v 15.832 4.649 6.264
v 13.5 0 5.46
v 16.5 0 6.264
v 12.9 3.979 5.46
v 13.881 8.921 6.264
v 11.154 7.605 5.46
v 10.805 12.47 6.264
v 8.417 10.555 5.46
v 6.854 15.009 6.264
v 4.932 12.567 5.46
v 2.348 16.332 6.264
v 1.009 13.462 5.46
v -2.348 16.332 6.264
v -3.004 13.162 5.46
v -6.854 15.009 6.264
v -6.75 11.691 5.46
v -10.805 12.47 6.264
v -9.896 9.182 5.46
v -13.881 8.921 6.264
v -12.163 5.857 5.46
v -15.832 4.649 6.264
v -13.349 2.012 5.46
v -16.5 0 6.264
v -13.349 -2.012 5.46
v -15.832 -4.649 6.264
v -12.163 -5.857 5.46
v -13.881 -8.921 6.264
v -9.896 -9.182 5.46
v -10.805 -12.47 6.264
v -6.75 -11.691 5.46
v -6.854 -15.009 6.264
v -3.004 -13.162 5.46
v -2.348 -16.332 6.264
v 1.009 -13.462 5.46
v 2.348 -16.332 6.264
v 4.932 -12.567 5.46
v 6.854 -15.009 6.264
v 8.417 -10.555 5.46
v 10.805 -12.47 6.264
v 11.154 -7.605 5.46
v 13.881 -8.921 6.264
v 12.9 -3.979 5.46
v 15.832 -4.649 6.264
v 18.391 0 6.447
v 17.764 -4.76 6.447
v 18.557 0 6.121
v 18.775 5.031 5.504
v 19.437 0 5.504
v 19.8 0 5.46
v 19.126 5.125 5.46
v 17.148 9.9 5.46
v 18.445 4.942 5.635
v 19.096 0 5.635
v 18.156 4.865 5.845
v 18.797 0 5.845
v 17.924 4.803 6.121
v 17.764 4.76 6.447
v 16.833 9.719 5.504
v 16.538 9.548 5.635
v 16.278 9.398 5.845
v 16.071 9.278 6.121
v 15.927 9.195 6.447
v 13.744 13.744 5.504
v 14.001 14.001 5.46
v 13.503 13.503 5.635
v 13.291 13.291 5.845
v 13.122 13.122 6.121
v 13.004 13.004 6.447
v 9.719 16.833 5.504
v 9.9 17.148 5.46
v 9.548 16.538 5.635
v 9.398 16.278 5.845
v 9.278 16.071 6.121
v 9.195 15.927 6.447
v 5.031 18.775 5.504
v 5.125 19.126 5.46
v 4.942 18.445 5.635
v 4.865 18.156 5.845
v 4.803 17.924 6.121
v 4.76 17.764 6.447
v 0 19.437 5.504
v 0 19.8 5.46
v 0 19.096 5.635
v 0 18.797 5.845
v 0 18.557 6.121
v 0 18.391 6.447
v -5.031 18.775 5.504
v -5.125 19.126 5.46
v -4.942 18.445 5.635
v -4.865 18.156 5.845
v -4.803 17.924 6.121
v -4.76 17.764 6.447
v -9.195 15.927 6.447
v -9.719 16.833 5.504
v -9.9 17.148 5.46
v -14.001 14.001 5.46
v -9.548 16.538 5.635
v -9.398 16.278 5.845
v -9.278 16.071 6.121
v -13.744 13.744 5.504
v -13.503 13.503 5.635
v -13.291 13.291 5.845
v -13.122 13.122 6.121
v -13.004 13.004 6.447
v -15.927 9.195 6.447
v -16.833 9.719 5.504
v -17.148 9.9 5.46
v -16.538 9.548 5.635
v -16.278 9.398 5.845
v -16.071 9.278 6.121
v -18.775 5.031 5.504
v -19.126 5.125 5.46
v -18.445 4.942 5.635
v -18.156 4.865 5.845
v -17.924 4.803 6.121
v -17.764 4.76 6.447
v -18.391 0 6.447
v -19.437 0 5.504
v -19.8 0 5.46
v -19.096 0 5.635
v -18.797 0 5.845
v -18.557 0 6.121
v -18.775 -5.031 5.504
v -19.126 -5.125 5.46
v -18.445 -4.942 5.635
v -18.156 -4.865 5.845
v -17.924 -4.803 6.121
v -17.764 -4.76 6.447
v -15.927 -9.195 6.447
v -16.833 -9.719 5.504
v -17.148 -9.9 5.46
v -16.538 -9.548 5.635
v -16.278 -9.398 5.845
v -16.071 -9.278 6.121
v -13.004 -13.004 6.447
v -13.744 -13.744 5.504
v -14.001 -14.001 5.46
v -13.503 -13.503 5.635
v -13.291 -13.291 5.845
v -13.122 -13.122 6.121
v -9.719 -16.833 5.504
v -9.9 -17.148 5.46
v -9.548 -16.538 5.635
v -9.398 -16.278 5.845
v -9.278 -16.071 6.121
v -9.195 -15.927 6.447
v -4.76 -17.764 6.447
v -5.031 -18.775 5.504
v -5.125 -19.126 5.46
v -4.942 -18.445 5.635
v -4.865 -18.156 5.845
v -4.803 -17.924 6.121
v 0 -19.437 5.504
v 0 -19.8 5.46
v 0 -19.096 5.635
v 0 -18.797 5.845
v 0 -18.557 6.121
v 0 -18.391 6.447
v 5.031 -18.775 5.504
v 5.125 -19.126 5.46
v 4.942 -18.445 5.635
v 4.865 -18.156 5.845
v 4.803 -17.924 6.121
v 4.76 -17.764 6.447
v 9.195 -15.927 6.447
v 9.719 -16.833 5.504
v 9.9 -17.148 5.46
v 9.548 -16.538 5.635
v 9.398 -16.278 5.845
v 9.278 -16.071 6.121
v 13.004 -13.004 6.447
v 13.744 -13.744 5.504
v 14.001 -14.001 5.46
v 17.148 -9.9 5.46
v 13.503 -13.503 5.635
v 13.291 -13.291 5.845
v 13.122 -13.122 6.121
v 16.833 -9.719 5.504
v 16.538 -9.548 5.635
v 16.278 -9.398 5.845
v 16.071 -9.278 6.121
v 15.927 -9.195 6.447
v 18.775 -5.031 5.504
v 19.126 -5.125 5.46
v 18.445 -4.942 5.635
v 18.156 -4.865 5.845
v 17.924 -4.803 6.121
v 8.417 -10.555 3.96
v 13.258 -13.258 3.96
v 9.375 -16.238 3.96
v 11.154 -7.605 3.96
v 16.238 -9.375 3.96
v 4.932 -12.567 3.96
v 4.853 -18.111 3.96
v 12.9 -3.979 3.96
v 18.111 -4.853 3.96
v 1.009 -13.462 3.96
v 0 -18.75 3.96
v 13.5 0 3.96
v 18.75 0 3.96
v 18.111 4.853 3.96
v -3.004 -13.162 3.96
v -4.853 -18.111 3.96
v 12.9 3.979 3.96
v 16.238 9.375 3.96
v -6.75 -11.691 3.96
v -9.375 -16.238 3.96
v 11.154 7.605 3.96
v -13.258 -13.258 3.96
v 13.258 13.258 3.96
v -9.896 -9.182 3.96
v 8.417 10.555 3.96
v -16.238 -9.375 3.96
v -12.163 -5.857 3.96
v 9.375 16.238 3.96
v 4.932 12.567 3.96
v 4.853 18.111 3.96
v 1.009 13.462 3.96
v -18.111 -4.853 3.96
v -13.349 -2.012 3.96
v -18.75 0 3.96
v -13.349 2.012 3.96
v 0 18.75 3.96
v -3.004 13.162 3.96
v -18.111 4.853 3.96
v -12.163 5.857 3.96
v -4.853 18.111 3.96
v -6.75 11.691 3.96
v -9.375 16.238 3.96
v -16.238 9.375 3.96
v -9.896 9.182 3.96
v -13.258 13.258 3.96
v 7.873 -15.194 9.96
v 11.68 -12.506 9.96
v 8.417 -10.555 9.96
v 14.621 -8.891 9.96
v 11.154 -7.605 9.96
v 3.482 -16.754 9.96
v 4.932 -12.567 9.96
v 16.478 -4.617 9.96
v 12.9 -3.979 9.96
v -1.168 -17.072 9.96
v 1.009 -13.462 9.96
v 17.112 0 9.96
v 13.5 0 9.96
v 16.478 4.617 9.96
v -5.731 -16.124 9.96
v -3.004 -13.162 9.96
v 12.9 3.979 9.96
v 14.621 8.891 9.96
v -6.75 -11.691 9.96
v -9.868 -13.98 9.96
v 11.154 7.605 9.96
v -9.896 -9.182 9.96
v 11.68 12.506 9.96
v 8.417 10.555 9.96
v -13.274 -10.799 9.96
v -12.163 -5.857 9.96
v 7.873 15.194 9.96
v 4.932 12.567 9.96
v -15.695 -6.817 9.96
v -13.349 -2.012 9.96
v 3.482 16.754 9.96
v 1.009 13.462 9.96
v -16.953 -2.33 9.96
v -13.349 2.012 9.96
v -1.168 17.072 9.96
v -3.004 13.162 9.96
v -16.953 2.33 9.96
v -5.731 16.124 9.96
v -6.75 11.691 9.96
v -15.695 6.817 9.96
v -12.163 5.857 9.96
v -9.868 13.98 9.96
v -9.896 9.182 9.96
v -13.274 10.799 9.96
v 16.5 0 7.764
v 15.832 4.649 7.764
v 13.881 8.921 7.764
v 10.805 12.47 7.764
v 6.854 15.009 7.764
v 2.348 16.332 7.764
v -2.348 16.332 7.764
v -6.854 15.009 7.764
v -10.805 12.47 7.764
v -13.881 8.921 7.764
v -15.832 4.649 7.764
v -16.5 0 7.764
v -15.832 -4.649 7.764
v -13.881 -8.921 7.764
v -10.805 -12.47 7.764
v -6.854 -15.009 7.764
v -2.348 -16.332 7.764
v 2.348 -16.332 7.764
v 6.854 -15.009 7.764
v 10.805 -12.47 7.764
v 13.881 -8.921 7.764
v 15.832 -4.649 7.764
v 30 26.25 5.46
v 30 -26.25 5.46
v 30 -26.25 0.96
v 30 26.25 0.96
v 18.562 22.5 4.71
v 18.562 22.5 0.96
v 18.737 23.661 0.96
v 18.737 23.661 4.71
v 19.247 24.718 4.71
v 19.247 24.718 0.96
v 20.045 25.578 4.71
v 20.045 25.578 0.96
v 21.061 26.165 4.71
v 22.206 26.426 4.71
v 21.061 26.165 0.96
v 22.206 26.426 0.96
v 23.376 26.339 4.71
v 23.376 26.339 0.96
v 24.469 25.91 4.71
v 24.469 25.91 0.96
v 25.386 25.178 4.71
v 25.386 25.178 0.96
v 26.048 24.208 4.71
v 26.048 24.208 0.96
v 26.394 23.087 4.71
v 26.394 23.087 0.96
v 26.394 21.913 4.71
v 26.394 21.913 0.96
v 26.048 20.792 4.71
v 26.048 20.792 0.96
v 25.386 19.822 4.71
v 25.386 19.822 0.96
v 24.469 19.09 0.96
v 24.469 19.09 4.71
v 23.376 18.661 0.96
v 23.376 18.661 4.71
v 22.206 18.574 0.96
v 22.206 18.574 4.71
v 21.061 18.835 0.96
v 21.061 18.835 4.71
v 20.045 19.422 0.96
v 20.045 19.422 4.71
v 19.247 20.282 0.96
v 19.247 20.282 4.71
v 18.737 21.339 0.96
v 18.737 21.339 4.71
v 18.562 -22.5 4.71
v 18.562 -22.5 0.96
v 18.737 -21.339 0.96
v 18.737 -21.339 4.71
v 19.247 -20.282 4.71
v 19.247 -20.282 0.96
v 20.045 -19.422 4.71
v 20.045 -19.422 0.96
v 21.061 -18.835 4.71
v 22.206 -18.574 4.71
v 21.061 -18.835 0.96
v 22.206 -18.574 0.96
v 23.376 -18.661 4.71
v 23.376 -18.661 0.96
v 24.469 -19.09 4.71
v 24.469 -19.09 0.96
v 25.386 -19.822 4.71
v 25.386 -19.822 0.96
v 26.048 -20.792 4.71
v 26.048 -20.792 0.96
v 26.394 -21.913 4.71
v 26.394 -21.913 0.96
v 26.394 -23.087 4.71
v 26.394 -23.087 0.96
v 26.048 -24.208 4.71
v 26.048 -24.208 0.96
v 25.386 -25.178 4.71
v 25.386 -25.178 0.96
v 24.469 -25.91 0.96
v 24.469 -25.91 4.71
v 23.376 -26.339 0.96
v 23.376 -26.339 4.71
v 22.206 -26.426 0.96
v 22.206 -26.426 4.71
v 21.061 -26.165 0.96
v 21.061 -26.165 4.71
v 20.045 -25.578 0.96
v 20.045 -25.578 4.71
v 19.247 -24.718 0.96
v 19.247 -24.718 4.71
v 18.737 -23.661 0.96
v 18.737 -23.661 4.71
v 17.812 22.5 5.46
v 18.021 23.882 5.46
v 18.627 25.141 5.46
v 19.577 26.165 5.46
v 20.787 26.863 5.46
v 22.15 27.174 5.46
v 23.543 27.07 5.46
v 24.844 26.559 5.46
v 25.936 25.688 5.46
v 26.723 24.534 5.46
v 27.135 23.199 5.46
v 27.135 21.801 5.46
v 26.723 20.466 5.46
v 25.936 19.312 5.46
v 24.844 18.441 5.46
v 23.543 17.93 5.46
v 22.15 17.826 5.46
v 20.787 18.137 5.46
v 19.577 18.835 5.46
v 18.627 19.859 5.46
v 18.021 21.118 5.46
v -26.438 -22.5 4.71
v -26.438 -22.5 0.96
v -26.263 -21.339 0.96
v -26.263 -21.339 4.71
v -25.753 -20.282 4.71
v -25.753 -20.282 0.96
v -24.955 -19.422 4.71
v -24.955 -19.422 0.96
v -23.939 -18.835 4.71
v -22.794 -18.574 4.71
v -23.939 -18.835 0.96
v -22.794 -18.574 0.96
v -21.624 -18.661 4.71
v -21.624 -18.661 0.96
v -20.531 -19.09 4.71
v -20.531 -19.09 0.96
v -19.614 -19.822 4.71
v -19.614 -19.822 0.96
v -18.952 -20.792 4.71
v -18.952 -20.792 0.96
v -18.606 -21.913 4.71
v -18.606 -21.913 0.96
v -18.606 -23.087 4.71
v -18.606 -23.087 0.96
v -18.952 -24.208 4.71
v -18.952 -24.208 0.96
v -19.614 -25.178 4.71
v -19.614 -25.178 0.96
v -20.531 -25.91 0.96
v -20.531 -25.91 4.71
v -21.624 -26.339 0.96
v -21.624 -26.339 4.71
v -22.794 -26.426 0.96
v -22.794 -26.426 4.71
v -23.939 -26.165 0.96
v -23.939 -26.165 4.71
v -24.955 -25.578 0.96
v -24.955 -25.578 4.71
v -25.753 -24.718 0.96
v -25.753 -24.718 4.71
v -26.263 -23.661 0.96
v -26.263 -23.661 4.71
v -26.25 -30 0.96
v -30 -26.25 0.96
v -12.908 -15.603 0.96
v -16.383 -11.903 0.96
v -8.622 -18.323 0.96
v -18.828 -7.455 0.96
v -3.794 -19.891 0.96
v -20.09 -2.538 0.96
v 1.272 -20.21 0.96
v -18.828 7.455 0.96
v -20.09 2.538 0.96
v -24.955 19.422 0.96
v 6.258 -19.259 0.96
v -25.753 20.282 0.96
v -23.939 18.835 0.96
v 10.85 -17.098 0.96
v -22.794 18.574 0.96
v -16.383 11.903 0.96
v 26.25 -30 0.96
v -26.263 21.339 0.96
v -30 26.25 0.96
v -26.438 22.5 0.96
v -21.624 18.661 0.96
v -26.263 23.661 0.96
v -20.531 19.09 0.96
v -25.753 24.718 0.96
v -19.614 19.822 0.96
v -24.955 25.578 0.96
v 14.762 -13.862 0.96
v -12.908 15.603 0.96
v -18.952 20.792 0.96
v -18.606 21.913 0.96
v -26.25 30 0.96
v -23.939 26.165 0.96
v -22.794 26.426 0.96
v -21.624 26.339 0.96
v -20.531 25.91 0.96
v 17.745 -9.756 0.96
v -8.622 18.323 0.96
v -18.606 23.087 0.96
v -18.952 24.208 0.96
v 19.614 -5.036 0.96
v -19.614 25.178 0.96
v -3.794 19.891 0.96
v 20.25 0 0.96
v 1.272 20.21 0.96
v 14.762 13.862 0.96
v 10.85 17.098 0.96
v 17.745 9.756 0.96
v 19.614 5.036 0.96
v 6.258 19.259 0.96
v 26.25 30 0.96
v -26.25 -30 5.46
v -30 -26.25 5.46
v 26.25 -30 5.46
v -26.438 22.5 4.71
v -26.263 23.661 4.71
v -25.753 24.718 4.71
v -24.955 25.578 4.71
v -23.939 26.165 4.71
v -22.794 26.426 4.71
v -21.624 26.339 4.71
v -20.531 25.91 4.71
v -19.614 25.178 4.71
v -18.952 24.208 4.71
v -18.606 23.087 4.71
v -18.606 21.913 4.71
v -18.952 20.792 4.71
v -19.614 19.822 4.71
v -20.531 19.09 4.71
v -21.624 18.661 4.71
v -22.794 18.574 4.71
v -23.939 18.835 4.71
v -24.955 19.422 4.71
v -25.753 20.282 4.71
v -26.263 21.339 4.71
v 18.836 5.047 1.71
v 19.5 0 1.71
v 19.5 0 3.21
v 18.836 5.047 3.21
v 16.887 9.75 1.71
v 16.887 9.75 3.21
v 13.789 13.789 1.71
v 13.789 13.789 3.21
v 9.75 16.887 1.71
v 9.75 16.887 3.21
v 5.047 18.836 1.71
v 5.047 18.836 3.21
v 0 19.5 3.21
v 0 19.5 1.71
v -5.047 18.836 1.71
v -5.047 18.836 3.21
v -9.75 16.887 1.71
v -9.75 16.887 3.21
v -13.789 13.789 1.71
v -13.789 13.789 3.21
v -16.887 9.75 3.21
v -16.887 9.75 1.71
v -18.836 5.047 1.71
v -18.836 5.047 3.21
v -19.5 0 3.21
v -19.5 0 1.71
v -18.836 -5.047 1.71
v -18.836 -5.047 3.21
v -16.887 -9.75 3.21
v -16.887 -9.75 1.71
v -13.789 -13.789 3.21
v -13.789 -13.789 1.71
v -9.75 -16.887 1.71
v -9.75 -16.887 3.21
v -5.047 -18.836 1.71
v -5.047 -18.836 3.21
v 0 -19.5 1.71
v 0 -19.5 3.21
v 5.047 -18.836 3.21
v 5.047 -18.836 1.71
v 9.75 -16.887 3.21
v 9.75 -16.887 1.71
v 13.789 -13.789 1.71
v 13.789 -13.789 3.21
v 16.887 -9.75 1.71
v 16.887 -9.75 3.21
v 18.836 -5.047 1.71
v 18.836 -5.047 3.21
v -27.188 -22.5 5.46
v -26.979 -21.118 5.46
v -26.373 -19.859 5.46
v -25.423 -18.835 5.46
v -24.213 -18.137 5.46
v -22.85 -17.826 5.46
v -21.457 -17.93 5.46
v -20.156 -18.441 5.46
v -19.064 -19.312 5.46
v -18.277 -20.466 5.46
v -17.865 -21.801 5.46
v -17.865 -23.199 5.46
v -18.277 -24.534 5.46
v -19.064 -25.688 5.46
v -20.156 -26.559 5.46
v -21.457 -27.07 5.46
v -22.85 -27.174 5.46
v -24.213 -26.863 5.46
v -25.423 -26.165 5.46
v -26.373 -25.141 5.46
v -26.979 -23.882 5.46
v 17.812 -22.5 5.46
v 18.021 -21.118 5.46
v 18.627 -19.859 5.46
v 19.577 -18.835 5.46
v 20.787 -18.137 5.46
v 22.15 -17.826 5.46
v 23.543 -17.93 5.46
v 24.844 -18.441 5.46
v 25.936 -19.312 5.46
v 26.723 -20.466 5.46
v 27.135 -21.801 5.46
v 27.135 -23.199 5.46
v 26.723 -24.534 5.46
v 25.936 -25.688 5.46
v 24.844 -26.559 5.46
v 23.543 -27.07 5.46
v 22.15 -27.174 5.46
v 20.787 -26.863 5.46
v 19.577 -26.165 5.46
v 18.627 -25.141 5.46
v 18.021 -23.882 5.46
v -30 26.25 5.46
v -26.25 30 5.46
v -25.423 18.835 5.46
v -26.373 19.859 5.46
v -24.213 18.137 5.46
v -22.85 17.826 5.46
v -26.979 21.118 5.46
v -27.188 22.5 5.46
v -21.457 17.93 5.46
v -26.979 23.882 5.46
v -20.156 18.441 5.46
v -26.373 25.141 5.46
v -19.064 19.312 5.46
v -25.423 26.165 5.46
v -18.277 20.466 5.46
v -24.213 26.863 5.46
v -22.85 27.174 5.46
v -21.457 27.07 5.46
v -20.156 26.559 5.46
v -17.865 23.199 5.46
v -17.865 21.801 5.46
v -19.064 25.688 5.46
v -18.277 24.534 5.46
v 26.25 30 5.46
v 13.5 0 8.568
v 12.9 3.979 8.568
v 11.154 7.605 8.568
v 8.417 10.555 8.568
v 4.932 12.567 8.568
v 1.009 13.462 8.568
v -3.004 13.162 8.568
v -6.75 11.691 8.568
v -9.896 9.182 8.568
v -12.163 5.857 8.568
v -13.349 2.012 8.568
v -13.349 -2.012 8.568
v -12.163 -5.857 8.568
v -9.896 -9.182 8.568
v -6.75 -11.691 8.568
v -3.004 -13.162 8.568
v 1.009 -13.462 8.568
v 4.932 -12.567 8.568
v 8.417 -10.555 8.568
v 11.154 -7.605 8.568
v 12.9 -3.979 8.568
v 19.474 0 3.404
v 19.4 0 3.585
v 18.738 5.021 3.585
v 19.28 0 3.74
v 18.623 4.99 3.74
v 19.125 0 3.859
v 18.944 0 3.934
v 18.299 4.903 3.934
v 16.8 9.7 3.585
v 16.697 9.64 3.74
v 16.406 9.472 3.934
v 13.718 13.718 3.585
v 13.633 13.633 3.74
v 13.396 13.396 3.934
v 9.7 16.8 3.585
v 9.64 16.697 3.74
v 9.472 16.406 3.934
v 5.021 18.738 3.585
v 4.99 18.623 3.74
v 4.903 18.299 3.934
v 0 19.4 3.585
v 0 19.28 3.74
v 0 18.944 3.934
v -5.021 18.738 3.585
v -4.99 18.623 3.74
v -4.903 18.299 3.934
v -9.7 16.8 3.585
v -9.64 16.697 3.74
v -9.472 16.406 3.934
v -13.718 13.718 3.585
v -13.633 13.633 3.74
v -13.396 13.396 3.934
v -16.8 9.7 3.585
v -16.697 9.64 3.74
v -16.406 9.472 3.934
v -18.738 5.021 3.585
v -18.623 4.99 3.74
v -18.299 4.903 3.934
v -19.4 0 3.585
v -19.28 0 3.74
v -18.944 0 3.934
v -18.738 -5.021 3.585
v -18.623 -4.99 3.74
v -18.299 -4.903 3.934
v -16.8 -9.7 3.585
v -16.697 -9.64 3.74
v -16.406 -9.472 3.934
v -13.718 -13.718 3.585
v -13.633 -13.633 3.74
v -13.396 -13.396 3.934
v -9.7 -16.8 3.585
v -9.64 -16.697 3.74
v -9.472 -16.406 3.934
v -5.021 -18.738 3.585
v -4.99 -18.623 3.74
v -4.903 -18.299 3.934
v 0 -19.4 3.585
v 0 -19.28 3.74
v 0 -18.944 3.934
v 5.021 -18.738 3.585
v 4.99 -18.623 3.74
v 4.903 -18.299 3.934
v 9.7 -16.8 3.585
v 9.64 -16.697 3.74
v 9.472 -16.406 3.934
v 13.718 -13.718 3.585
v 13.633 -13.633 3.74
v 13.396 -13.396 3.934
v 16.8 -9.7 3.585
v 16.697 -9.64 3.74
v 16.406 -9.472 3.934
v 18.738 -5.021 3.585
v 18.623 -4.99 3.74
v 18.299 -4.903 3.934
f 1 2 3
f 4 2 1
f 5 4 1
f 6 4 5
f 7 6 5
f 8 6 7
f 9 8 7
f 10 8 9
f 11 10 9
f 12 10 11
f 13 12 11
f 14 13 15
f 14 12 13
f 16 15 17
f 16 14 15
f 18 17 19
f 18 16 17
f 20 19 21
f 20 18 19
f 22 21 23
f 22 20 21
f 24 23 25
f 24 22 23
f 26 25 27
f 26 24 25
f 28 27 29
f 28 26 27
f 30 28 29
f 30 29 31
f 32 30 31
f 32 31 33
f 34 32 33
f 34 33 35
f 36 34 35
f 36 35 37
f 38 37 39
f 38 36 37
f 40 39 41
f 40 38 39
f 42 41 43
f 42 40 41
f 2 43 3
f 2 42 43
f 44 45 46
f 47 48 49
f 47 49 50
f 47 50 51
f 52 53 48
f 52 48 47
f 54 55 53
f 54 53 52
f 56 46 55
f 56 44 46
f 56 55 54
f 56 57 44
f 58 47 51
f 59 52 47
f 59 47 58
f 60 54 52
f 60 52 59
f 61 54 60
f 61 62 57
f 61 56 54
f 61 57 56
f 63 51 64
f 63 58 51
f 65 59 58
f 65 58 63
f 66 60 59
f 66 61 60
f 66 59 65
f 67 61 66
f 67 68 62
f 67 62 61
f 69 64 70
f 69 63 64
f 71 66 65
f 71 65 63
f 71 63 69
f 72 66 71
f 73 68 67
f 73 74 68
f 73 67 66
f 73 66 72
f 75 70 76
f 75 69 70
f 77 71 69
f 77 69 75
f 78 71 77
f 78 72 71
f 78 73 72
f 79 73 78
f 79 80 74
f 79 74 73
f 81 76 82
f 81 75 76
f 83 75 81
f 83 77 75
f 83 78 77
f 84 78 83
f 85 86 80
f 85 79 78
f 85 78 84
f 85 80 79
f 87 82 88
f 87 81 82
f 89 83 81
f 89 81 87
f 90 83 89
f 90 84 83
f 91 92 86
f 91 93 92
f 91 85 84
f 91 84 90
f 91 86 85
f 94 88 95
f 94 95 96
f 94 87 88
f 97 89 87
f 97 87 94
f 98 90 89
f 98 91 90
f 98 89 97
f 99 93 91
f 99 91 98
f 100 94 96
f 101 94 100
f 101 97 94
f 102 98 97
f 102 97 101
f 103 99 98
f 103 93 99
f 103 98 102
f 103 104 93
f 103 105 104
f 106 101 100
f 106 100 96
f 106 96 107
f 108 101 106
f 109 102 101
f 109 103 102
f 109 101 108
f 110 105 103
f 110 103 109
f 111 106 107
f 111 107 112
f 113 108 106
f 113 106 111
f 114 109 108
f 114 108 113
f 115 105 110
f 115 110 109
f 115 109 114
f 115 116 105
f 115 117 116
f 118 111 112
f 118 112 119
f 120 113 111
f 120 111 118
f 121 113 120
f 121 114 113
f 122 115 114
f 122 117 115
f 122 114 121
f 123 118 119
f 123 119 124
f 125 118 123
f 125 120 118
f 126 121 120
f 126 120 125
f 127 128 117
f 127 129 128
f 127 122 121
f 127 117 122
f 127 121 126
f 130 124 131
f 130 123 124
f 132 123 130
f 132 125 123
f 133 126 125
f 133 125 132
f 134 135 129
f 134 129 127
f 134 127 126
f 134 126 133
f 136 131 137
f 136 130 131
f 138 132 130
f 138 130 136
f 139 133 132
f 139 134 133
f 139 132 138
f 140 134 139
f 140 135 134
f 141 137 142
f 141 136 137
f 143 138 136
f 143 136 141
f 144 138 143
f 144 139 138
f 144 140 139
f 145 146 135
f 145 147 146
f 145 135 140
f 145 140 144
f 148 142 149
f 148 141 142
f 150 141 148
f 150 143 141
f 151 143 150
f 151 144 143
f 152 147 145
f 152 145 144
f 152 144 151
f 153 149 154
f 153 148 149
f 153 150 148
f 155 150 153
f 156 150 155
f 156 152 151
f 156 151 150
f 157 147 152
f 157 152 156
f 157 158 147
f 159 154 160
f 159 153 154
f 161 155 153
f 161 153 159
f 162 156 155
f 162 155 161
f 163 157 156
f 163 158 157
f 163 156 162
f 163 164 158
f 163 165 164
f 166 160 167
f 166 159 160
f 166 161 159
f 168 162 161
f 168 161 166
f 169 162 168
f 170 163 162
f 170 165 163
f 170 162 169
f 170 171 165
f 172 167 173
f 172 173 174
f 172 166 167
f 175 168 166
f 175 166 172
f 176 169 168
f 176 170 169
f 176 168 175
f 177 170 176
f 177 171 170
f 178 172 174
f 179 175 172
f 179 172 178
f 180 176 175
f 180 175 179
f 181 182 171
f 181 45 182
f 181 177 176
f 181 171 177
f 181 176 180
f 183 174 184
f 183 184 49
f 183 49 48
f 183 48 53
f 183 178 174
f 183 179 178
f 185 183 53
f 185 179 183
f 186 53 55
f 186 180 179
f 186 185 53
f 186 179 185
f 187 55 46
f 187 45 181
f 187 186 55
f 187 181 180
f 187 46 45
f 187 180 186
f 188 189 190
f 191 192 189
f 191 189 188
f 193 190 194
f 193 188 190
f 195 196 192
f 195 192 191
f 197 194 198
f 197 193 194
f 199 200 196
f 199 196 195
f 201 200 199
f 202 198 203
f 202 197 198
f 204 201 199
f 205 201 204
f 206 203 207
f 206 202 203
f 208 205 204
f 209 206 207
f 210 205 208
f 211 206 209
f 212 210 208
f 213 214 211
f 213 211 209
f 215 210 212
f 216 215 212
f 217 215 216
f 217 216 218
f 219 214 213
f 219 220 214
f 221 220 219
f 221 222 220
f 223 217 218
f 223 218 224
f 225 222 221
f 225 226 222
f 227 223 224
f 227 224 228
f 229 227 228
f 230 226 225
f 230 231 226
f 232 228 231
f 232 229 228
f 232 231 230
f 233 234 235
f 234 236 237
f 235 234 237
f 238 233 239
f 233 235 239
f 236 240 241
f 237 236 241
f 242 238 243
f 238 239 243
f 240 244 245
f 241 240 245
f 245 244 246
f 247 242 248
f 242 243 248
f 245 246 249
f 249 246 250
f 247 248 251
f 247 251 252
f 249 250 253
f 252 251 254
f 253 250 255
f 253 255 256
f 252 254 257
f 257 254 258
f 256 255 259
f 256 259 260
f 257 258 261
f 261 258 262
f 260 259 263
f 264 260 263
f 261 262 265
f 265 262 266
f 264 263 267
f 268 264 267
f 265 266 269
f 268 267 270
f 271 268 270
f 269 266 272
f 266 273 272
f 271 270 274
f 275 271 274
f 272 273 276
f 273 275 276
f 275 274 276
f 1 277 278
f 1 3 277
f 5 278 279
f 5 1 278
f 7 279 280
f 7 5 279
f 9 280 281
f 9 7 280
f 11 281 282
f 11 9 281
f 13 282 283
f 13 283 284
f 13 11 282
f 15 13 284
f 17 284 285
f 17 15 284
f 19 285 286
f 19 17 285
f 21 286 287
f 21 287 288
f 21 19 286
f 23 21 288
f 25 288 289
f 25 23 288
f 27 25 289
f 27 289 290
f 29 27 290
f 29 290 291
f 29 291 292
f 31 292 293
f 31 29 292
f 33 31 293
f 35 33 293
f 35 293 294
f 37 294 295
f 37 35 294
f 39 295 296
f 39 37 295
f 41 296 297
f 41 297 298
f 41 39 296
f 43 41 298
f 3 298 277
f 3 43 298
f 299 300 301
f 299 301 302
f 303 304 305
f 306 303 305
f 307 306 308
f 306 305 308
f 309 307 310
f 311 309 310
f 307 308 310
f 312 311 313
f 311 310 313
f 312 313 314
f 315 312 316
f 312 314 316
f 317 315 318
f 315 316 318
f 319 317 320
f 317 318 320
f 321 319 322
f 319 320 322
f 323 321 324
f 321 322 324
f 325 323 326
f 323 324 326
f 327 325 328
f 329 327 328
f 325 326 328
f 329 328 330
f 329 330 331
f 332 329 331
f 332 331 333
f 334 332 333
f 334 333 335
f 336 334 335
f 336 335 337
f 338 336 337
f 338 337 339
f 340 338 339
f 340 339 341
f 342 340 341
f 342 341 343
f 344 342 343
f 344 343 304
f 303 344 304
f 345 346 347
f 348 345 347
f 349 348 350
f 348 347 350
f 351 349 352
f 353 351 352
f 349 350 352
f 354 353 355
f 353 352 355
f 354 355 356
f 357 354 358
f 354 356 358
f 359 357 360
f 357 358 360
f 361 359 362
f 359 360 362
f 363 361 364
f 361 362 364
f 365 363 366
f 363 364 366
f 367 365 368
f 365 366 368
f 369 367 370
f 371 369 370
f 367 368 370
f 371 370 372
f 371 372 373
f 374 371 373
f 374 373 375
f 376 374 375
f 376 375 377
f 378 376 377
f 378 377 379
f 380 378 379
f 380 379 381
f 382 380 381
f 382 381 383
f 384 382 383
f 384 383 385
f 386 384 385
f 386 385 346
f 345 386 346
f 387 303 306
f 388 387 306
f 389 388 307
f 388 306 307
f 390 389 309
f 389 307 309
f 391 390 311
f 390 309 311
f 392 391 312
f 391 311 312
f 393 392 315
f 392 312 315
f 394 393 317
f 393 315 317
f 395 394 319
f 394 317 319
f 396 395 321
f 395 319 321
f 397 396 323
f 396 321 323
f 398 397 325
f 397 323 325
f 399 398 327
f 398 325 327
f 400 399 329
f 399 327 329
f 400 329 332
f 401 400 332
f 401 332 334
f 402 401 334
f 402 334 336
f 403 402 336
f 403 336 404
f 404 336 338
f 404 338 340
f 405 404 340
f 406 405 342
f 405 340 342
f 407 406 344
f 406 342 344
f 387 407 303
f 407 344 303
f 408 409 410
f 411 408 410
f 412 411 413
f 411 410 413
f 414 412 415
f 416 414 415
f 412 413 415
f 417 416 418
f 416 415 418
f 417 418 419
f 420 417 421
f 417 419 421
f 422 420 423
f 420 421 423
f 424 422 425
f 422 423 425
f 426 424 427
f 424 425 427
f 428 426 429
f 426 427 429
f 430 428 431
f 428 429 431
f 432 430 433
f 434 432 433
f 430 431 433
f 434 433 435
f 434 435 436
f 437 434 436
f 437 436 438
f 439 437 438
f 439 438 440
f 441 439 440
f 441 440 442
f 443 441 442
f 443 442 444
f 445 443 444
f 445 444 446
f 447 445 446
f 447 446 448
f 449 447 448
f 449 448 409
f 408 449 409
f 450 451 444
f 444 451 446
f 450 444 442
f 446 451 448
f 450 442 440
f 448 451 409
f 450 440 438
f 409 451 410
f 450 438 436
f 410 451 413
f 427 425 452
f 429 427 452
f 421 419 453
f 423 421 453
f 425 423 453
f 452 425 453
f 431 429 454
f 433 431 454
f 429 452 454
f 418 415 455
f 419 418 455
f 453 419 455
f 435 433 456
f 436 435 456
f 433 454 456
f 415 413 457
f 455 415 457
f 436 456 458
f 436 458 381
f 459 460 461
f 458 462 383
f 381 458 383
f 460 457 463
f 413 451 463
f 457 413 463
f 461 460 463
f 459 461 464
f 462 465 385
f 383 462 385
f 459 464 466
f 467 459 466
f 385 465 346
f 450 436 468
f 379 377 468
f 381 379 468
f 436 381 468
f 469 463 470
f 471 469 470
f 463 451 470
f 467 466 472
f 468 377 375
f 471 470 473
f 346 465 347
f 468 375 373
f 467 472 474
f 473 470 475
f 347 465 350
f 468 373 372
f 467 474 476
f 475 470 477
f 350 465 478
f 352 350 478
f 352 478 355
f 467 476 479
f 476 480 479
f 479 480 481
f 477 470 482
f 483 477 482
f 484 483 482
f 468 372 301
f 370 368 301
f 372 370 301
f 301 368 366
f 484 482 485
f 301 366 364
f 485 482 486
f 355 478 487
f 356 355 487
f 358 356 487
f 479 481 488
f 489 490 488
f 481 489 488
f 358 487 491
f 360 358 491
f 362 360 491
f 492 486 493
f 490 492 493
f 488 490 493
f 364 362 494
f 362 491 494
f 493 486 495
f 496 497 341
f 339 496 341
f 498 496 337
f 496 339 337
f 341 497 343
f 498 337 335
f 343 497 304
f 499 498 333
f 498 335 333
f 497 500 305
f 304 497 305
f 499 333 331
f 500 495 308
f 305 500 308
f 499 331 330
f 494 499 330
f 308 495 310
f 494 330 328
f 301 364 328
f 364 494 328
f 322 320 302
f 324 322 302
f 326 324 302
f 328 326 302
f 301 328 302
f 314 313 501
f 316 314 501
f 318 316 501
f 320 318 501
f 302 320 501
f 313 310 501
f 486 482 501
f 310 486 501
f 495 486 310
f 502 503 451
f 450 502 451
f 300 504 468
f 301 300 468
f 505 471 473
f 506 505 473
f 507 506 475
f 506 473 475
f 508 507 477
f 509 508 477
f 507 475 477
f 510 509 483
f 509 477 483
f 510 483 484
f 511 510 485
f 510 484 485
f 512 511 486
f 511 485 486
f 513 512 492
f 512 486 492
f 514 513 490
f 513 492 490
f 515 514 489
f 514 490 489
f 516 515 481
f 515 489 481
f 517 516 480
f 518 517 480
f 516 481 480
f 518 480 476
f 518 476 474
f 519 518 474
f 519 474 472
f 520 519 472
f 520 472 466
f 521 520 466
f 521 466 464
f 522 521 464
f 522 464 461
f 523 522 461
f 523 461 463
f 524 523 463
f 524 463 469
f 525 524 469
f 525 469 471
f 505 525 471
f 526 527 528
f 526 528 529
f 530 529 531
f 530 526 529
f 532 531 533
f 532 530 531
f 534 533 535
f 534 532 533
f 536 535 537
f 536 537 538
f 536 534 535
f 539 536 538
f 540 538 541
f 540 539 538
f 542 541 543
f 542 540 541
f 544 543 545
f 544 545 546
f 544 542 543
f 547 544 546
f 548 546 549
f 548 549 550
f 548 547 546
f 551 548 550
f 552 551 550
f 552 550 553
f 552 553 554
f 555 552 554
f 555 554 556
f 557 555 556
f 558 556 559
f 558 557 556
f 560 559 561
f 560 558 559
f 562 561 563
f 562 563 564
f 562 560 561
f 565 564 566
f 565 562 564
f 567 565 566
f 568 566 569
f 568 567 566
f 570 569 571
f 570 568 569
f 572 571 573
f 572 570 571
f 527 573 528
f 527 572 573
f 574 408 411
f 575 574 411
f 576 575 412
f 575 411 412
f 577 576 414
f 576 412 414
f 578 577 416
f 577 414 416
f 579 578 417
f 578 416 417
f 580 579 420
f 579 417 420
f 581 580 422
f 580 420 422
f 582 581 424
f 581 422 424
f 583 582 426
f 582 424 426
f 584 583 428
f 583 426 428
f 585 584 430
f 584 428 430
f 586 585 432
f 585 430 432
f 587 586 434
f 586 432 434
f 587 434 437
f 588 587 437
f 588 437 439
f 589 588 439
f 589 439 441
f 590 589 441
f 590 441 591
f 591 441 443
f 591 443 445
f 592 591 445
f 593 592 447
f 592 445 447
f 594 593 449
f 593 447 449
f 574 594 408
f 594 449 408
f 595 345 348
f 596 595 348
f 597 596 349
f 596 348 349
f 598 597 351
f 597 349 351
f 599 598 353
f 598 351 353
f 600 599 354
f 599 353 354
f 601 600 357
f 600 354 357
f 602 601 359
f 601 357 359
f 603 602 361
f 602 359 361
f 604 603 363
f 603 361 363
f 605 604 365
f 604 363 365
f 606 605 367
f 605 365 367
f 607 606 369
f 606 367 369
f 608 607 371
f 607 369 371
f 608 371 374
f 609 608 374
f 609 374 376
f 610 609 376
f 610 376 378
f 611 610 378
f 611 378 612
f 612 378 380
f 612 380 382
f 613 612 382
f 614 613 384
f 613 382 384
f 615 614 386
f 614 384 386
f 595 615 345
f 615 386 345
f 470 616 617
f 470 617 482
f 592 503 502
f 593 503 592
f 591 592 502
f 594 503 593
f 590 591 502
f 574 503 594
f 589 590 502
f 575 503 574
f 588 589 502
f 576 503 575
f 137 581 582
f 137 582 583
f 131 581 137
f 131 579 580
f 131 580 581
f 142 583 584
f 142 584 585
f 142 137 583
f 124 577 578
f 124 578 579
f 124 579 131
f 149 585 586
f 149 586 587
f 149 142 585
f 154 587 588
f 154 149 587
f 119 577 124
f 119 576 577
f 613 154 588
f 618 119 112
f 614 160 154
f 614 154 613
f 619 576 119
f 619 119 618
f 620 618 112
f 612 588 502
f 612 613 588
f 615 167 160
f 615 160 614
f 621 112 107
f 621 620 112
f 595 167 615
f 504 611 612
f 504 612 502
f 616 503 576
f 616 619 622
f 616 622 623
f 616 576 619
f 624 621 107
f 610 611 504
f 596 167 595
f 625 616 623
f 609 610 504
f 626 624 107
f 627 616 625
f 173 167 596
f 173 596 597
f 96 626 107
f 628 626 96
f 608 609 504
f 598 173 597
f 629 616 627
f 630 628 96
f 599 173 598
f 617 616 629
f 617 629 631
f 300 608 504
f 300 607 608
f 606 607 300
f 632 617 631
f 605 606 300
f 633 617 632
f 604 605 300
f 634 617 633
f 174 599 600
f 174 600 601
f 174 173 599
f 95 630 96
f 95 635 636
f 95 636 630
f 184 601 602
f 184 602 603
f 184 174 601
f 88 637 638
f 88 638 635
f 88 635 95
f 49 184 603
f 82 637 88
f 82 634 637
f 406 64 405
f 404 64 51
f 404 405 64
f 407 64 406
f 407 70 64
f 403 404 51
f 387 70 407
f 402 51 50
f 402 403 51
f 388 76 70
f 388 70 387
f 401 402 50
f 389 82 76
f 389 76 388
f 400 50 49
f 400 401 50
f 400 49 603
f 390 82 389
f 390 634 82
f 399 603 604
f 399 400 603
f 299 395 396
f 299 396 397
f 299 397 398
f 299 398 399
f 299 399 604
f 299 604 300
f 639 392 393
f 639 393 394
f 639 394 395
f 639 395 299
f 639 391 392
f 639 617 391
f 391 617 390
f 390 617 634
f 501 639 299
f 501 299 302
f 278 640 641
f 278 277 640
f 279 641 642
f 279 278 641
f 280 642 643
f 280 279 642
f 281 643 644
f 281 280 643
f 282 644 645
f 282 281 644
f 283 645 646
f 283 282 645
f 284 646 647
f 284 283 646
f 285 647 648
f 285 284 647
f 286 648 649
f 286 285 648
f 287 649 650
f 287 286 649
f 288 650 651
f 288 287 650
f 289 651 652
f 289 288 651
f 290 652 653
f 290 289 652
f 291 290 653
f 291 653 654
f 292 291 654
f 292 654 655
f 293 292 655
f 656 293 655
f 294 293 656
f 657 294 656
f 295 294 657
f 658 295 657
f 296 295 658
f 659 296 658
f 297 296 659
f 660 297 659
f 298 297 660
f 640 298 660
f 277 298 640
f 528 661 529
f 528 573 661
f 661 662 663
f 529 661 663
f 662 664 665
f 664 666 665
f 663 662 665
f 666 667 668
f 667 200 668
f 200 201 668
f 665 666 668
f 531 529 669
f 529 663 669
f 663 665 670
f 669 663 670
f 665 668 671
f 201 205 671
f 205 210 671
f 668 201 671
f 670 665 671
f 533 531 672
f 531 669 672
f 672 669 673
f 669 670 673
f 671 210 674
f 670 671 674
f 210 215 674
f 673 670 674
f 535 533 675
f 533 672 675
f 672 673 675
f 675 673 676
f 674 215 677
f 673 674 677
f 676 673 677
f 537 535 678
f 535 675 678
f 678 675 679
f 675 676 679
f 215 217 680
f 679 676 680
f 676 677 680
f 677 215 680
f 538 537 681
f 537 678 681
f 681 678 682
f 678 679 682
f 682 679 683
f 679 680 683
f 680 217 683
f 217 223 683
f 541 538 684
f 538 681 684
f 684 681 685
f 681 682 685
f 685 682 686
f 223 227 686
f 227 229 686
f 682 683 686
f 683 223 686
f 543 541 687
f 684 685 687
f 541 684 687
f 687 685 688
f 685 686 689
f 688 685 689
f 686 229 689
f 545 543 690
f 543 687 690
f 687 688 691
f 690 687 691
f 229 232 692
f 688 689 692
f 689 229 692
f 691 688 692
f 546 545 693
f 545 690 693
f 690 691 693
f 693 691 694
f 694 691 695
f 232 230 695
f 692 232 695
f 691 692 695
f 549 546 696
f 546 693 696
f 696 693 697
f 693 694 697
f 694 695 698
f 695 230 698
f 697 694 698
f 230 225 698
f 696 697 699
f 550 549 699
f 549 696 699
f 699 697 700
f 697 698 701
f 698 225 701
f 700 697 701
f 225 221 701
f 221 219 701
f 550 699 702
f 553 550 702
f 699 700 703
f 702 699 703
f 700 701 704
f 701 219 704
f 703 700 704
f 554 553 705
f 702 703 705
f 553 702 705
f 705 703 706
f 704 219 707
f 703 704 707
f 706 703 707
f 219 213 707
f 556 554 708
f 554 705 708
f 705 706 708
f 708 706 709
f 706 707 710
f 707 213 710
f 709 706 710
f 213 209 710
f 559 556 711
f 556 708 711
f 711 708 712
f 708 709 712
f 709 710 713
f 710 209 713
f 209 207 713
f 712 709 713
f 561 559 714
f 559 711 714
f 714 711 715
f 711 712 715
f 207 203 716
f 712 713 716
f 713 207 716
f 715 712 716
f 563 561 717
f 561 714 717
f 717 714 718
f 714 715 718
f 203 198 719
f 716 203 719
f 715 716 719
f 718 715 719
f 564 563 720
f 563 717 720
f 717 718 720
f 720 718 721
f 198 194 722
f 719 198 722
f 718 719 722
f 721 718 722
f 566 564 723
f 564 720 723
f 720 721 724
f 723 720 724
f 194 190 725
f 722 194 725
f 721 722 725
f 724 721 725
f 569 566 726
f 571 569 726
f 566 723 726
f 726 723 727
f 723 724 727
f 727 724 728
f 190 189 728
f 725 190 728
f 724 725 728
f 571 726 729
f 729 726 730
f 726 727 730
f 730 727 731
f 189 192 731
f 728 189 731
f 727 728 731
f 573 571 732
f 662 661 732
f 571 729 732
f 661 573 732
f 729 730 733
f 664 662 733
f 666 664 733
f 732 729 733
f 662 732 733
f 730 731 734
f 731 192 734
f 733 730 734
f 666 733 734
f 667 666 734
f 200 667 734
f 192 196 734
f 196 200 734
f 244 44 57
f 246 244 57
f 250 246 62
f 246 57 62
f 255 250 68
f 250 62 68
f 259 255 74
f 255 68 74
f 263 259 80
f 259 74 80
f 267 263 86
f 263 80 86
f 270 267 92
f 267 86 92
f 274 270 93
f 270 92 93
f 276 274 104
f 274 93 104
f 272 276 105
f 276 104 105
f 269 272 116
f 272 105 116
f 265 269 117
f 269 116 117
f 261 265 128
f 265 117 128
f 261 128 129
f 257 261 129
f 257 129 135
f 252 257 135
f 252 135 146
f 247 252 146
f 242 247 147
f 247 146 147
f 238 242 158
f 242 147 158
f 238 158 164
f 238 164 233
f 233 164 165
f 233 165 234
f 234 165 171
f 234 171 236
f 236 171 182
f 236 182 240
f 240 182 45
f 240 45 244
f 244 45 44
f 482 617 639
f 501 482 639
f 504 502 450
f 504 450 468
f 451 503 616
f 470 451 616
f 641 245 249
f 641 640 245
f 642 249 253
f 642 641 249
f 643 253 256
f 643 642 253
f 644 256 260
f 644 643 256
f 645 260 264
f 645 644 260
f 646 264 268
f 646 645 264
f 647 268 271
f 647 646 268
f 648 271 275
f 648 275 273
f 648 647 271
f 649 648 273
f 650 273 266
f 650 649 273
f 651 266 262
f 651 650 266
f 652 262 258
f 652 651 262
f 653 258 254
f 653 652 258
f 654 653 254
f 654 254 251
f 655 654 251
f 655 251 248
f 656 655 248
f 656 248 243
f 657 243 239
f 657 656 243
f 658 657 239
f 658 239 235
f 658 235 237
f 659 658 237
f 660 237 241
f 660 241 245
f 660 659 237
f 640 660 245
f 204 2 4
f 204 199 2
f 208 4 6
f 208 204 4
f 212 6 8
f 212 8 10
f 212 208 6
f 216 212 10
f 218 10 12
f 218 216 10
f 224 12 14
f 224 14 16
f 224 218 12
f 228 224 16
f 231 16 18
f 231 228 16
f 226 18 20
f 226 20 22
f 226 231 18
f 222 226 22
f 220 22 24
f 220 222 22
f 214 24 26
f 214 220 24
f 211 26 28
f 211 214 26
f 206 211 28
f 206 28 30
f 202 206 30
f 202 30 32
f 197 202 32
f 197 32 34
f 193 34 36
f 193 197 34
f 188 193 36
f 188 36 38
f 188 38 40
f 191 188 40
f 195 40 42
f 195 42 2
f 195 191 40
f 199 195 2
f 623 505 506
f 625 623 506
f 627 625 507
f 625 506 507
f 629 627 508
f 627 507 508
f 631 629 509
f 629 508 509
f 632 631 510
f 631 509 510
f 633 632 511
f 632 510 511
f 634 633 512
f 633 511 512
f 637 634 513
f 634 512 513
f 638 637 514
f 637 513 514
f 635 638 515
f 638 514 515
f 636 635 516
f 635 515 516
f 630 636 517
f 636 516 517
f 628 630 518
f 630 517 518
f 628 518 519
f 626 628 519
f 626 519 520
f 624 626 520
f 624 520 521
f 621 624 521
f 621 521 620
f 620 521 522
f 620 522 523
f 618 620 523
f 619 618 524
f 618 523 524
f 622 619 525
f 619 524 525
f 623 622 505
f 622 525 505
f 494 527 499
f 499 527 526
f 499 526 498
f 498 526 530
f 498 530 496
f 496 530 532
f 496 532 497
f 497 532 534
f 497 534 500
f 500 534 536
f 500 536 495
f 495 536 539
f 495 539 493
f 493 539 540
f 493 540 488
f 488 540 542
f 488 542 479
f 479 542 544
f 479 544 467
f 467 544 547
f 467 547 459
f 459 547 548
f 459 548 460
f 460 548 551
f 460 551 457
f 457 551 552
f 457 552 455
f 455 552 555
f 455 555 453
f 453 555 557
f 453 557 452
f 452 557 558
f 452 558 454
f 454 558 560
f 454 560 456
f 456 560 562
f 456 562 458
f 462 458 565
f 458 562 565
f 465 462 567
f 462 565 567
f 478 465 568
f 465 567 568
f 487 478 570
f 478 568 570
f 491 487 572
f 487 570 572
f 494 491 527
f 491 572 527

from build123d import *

# Parameters (mm, degrees)
SKETCH1_W                        = 80
SKETCH1_H                        = 80
BOSS_EXTRUDE1_DEPTH              = 6
F_10_5_10_5_DIAMETER_HOLE1_D     = 10.5
F_10_5_10_5_DIAMETER_HOLE1_DEPTH = 6
CHAMFER1_SIZE                    = 5
CHAMFER2_SIZE                    = 1
FILLET1_R                        = 1
FILLET2_R                        = 2
SCALE1_SCALE                     = 0.75


with BuildPart() as part:
    # Sketch1 → Boss-Extrude1 (new body)
    with BuildSketch(Plane.XY.offset(6)):
        Rectangle(SKETCH1_W, SKETCH1_H)
    extrude(amount=-BOSS_EXTRUDE1_DEPTH)

    # Sketch2 → Revolve1 (revolve)
    with BuildSketch(Plane(origin=(0, 0, 0), x_dir=(1, 0, 0), z_dir=(0, 1, 0))):
        Polygon((25, -6), (0, -6), (0, -12), (22.816178594, -12), align=None)
    revolve(axis=Axis((0, 0, 6), (0, 0, 1)))

    # Sketch3 → Cut-Revolve1 (revolve, cut)
    with BuildSketch(Plane(origin=(0, 0, 0), x_dir=(1, 0, 0), z_dir=(0, 1, 0))):
        Polygon((26, 0), (0, 0), (0, -12), (18, -12), (18, -10.143593539), (22, -9.07179677), (22, -7.07179677), (18, -6), (18, -4), (26, -4), align=None)
    revolve(axis=Axis((0, 0, 0), (0, 0, 1)), mode=Mode.SUBTRACT)

    # Ø10.5 (10.5) Diameter Hole1
    with Locations(Plane.XY.offset(6)):
        with Locations((30, 30), (-30, 30), (-30, -30), (30, -30)):
            Hole(F_10_5_10_5_DIAMETER_HOLE1_D / 2, depth=F_10_5_10_5_DIAMETER_HOLE1_DEPTH)

    # Chamfer1
    chamfer1_edges = [part.edges().sort_by_distance(p)[0] for p in [
        (-40, -40, 3),
        (-40, 40, 3),
        (40, 40, 3),
        (40, -40, 3),
    ]]
    chamfer(chamfer1_edges, length=CHAMFER1_SIZE)

    # Chamfer2
    chamfer2_edges = [part.edges().sort_by_distance(p)[0] for p in [
        (-26, 0, 0),
        (35.25, -30, 6),
        (-24.75, -30, 6),
        (-24.75, 30, 6),
        (35.25, 30, 6),
    ]]
    chamfer(chamfer2_edges, length=CHAMFER2_SIZE)

    # Fillet1
    fillet1_edges = [part.edges().sort_by_distance(p)[0] for p in [
        (-26, 0, 4),
    ]]
    fillet(fillet1_edges, radius=FILLET1_R)

    # Fillet2
    fillet2_edges = [part.edges().sort_by_distance(p)[0] for p in [
        (-25, 0, 6),
    ]]
    fillet(fillet2_edges, radius=FILLET2_R)


with BuildPart() as part_1:
    # Scale1: scaled about (0, 0, 3.839535201)
    add(part.part.scale(SCALE1_SCALE).moved(Location((0, 0, 0.9598838))))


solid = part_1.part
